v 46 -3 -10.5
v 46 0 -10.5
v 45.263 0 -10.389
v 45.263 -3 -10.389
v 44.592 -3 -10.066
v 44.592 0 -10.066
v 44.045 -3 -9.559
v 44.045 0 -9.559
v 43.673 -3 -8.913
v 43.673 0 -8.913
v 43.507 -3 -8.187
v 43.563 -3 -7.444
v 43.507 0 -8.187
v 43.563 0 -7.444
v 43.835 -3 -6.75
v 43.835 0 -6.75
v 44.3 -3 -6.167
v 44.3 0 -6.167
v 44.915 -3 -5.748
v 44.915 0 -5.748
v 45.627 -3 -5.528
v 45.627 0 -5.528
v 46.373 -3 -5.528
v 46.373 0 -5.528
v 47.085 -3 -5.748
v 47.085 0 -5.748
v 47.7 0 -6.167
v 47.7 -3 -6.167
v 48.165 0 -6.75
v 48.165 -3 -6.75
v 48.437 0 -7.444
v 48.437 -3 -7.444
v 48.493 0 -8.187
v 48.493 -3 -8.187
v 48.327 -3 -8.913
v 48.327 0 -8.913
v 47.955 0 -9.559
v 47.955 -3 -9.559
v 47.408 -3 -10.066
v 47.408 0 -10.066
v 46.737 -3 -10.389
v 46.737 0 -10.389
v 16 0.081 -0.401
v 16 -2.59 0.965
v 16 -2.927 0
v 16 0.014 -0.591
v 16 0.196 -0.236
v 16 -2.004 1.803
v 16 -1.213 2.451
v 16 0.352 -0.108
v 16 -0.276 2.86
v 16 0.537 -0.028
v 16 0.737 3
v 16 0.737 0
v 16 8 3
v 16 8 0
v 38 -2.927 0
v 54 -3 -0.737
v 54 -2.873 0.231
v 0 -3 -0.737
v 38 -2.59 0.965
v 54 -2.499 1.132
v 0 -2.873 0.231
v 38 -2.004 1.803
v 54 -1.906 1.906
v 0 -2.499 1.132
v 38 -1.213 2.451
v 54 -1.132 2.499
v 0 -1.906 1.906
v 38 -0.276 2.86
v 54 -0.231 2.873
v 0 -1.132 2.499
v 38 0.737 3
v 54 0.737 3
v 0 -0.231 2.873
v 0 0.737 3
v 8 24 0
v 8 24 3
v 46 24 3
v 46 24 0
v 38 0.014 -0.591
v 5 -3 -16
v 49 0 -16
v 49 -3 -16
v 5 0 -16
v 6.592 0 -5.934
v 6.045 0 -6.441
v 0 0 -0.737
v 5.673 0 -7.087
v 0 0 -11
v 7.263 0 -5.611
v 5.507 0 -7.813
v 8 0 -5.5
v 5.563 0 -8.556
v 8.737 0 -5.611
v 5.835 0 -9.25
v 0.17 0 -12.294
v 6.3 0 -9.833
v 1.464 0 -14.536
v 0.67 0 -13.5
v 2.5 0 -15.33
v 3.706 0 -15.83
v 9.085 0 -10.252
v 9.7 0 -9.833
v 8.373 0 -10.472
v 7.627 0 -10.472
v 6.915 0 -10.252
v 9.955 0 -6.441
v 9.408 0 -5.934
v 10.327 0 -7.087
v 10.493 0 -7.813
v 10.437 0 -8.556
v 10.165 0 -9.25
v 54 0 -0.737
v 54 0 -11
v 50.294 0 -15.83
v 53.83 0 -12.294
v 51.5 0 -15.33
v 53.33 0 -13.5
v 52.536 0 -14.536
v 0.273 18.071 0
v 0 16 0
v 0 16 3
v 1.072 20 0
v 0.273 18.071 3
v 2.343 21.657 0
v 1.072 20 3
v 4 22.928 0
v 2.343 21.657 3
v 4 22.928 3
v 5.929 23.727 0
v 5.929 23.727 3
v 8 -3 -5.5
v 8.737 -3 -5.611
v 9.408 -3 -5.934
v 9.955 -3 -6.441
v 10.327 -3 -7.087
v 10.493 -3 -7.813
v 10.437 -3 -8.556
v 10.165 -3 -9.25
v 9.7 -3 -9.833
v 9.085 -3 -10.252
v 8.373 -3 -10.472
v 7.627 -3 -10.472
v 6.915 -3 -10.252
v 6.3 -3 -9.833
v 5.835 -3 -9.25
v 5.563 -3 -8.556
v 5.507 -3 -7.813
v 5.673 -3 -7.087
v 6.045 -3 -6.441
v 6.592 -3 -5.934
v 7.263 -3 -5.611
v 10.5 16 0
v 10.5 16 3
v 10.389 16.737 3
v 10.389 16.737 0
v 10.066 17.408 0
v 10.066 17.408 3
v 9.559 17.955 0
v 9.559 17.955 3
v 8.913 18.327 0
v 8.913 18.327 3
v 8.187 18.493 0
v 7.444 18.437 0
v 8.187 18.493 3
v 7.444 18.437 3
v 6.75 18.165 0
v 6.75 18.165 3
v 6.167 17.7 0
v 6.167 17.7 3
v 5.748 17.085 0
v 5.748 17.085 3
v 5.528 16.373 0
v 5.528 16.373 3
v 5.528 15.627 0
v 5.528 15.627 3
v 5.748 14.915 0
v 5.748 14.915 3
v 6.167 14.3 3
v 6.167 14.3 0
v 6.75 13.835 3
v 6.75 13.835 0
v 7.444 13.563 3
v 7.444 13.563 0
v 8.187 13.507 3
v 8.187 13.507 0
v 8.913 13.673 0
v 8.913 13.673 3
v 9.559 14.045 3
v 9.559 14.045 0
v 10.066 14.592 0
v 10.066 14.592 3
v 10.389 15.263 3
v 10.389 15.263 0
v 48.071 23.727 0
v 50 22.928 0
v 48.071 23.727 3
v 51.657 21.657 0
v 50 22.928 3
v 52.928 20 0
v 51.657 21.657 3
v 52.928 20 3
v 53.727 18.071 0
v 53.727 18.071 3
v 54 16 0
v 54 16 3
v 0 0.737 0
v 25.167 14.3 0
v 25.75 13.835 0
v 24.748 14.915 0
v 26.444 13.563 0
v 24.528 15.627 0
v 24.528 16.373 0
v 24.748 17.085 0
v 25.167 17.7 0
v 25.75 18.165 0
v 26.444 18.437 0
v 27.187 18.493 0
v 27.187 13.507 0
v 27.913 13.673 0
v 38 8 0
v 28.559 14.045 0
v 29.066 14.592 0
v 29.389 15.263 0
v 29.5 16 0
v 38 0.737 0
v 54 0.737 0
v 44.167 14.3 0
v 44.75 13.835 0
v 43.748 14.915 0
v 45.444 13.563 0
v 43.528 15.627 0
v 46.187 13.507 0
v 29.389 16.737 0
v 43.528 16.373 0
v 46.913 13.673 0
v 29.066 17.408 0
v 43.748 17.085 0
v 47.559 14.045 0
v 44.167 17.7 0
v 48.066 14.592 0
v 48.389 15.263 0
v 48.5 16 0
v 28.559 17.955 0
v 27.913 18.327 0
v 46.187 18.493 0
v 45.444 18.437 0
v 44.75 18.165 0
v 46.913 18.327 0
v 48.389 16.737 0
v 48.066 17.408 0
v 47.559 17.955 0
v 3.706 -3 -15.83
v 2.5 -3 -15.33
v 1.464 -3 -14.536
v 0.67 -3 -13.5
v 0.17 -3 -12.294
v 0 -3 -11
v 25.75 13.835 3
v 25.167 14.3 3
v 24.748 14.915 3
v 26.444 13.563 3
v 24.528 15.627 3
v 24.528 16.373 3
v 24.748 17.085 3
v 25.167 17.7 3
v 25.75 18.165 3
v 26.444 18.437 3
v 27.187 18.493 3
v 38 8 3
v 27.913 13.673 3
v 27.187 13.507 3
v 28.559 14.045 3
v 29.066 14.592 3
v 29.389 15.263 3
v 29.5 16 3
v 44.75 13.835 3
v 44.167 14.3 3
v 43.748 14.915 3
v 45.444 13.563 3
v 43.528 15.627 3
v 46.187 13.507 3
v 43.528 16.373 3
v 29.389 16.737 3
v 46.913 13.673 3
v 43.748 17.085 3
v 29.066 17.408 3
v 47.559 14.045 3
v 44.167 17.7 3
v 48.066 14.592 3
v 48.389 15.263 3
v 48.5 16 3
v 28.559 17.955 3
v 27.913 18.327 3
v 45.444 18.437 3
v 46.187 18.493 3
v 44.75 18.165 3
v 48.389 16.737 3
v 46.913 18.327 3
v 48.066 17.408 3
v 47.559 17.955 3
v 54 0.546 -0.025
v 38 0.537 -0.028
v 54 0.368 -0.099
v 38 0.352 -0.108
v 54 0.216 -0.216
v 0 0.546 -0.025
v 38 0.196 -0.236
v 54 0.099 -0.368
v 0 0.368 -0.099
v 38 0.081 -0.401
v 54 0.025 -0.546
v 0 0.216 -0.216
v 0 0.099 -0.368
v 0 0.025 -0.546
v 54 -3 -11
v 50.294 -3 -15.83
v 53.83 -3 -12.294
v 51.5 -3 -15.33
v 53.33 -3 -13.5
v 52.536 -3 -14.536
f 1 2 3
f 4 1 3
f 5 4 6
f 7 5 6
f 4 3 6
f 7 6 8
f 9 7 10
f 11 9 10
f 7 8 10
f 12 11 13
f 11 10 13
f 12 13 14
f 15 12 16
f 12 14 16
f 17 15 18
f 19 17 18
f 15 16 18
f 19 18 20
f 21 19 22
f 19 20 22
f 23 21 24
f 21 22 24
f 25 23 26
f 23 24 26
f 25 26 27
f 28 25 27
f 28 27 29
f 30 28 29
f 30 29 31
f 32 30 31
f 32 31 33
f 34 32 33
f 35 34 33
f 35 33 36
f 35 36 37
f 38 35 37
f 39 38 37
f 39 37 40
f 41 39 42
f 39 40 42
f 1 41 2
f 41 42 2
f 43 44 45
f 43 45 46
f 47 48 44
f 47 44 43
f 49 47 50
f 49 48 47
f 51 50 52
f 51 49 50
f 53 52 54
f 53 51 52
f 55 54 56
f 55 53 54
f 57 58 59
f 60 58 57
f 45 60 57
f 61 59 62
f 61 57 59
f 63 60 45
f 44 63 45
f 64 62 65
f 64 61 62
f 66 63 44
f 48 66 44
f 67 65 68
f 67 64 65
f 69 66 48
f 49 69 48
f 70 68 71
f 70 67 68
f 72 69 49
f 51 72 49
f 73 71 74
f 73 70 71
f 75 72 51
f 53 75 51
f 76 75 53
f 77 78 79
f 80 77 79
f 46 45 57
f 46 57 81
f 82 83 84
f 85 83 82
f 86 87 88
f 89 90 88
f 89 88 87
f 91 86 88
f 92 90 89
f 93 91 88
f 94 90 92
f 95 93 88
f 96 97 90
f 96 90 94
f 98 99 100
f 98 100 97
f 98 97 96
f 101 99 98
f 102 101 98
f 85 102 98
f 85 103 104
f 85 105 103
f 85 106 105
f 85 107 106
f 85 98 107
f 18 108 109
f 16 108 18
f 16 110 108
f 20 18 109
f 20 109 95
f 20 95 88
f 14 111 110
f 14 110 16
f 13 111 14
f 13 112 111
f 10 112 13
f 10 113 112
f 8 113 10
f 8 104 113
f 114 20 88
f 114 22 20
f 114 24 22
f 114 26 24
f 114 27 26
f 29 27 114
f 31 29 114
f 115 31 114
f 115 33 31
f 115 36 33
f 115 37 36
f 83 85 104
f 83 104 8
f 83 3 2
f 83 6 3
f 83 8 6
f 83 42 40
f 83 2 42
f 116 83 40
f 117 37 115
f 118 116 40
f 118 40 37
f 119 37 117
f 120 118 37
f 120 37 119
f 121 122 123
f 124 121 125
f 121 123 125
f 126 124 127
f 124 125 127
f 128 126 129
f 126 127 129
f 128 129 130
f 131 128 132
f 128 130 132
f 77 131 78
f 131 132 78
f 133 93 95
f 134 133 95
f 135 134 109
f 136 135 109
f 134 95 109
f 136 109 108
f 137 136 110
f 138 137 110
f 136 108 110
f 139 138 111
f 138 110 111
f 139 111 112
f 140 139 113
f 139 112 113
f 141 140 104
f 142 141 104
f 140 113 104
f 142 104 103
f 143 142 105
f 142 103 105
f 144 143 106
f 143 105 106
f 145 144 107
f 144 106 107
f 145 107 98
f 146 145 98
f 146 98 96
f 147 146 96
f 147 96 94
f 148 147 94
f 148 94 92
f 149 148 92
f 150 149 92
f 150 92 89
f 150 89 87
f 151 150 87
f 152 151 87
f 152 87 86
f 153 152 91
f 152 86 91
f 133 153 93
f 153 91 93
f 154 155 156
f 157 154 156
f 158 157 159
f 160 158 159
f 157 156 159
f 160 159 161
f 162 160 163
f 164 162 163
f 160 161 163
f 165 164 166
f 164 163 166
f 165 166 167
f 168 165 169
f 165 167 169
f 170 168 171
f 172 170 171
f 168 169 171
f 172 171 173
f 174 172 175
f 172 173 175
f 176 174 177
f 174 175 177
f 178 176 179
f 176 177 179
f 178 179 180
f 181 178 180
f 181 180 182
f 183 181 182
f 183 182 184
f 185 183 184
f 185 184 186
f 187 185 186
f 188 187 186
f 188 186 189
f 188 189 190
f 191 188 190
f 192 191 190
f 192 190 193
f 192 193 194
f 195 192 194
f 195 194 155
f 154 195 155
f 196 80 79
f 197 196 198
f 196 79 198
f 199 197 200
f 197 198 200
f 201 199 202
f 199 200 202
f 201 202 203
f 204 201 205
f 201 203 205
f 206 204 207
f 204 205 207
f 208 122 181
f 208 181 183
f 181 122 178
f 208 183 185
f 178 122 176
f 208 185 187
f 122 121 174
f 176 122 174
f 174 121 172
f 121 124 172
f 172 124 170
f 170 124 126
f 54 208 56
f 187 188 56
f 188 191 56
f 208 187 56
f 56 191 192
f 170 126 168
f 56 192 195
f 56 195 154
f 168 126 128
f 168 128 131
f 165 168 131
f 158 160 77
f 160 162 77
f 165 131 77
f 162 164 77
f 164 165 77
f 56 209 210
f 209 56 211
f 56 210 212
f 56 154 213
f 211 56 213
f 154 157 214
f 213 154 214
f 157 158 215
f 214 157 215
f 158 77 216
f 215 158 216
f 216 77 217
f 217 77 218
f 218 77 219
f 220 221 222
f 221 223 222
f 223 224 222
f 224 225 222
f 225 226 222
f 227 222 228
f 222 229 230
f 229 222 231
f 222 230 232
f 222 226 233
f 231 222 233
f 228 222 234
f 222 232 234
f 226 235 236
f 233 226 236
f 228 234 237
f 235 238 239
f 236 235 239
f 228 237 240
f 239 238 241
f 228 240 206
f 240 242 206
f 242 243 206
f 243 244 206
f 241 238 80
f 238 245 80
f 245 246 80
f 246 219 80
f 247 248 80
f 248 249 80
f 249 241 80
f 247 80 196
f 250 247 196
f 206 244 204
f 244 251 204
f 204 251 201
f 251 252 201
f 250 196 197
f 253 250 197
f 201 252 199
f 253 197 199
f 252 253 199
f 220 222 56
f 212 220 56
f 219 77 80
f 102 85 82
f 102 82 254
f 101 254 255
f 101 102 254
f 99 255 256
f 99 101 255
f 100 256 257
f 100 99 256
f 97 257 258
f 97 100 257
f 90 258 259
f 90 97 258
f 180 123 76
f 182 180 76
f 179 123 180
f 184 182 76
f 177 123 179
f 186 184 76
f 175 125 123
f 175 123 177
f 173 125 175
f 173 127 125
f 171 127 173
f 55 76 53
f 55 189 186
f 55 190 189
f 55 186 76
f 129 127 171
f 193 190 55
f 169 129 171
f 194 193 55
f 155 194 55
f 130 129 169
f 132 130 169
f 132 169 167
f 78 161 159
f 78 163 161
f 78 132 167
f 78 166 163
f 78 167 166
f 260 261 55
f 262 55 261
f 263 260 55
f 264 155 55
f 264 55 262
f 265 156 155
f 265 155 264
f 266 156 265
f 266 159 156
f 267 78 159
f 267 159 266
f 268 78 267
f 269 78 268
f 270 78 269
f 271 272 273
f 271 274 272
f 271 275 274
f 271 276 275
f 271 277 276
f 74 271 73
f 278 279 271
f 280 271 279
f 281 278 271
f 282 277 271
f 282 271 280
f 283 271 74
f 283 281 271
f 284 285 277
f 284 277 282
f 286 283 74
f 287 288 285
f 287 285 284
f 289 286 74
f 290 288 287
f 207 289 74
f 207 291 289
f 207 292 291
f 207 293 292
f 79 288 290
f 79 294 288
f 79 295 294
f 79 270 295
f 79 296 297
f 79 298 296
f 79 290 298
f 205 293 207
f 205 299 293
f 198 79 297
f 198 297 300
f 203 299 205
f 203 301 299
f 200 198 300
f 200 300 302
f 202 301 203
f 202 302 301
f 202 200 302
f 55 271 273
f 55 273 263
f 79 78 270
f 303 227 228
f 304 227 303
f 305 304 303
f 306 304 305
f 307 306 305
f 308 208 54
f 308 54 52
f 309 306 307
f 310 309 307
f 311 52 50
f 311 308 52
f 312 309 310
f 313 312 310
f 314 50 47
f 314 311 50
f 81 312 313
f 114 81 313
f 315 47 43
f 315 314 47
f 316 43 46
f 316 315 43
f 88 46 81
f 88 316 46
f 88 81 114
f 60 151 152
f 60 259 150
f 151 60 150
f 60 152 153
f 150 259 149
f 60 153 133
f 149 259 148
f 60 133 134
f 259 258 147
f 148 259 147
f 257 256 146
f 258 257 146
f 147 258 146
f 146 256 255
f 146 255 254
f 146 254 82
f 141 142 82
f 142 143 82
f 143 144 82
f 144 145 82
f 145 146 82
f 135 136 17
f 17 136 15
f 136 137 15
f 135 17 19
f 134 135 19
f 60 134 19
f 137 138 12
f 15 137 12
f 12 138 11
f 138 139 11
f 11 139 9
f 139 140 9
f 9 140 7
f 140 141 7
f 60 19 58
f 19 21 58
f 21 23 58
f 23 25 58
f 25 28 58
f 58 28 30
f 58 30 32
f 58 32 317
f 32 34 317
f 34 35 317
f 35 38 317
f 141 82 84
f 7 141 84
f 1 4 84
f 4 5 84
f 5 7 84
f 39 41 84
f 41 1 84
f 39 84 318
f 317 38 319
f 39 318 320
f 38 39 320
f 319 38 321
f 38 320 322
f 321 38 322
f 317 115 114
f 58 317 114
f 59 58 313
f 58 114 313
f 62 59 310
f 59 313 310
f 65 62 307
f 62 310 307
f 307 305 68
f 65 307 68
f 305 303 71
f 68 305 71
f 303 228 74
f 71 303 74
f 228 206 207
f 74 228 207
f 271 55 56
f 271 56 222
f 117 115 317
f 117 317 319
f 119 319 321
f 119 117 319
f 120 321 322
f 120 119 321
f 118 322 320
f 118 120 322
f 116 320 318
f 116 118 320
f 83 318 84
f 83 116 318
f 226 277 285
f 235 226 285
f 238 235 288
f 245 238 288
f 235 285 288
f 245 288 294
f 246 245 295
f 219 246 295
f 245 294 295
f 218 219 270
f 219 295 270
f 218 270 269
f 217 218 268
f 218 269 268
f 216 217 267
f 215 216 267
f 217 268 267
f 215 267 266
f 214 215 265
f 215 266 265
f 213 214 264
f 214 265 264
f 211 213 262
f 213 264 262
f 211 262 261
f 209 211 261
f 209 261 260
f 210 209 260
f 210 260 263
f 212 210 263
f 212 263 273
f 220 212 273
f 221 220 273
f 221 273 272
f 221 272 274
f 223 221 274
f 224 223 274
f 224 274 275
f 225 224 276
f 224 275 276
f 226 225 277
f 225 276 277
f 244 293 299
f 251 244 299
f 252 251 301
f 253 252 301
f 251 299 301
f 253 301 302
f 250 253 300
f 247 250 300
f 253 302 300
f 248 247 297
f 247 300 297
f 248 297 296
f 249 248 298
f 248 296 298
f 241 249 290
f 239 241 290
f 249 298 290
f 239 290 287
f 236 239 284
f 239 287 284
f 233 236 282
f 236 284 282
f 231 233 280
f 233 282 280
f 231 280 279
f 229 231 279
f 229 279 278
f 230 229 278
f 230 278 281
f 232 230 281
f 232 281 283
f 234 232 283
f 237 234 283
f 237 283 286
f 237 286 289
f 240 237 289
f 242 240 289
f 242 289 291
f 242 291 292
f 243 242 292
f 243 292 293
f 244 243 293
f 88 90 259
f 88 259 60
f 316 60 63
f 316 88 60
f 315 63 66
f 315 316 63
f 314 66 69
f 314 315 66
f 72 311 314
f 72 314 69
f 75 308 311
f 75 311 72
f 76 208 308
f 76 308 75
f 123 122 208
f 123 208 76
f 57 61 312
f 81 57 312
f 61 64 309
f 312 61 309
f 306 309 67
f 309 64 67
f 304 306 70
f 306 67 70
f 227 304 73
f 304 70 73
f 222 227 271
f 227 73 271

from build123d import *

# Parameters (mm, degrees)
SKETCH1_R                    = 2.5
BASE_FLANGE1_DEPTH           = 3
EDGE_FLANGE1_STRIP_W         = 13.4732
EDGE_FLANGE1_STRIP_H         = 3
EDGE_FLANGE1_STRIP_CUT_DEPTH = 54
EDGE_FLANGE1_DEPTH           = 54
CUT_EXTRUDE1_START           = 16
CUT_EXTRUDE1_DEPTH           = 22
SKETCH10_R                   = 2.5
CUT_EXTRUDE2_DEPTH           = 10
SKETCH11_W                   = 22
SKETCH11_H                   = 16
SKETCH11_R                   = 2.5
BOSS_EXTRUDE1_DEPTH          = 3


# Read off the part's stored shape, not the designer's step: Cut-Extrude1
# Sheet-metal steps are written as plain solids
with BuildPart() as part:
    # Sketch1 → Base-Flange1 (new body)
    with BuildSketch(Plane(origin=(0, 0, 0), x_dir=(1, 0, 0), z_dir=(0, 1, 0))):
        with BuildLine():
            Line((0, 0), (54, 0))
            Line((54, 0), (54, 11))
            ThreePointArc((54, 11), (52.535533906, 14.535533906), (49, 16))
            Line((49, 16), (5, 16))
            ThreePointArc((5, 16), (1.464466094, 14.535533906), (0, 11))
            Line((0, 11), (0, 0))
        make_face()
        with Locations(Location((8, 8, 0), (0, 0, 270))):
            Circle(SKETCH1_R, mode=Mode.SUBTRACT)
        with Locations(Location((46, 8, 0), (0, 0, 90))):
            Circle(SKETCH1_R, mode=Mode.SUBTRACT)
    extrude(amount=-BASE_FLANGE1_DEPTH)

    # Edge-Flange1 strip (across the edge) → Edge-Flange1 strip cut (cut)
    with BuildSketch(Plane(origin=(0, 0, 0), x_dir=(0, 0, -1), z_dir=(1, 0, 0))):
        with Locations((-6, -1.5)):
            Rectangle(EDGE_FLANGE1_STRIP_W, EDGE_FLANGE1_STRIP_H)
    extrude(amount=EDGE_FLANGE1_STRIP_CUT_DEPTH, mode=Mode.SUBTRACT)

    # Edge-Flange1 section (across the edge) → Edge-Flange1 (add)
    with BuildSketch(Plane(origin=(0, 0, 0), x_dir=(0, 0, -1), z_dir=(1, 0, 0))):
        with BuildLine():
            Line((-3, 0.7366), (-3, 24))
            Line((-3, 24), (0, 24))
            Line((0, 24), (0, 0.7366))
            ThreePointArc((0, 0.7366), (0.215745145, 0.215745145), (0.7366, 0))
            Line((0.7366, 0), (0.7366, -3))
            ThreePointArc((0.7366, -3), (-1.905575199, -1.905575199), (-3, 0.7366))
        make_face()
    extrude(amount=EDGE_FLANGE1_DEPTH)

    # Cut-Extrude1 outline → Cut-Extrude1 (cut)
    with BuildSketch(Plane.YZ.offset(CUT_EXTRUDE1_START)):
        with BuildLine():
            Line((-2.926677222, 0), (0.014454199, -0.591393245))
            ThreePointArc((0.014454199, -0.591393245), (0.269898669, -0.166714548), (0.7366, 0))
            Line((0.7366, 0), (24, 0))
            Line((24, 0), (24, 3))
            Line((24, 3), (0.7366, 3))
            ThreePointArc((0.7366, 3), (-1.630867001, 2.154295979), (-2.926677222, 0))
        make_face()
    extrude(amount=CUT_EXTRUDE1_DEPTH, mode=Mode.SUBTRACT)

    # Sketch10 → Cut-Extrude2 (cut)
    with BuildSketch(Plane.XY.offset(3)):
        with BuildLine():
            ThreePointArc((46, 24), (51.656854249, 21.656854249), (54, 16))
            Line((54, 16), (54, 24))
            Line((54, 24), (46, 24))
        make_face()
        with Locations((46, 16)):
            Circle(SKETCH10_R)
        with Locations((8, 16)):
            Circle(SKETCH10_R)
        with BuildLine():
            ThreePointArc((0, 16), (2.343145751, 21.656854249), (8, 24))
            Line((8, 24), (0, 24))
            Line((0, 24), (0, 16))
        make_face()
    extrude(amount=-CUT_EXTRUDE2_DEPTH, mode=Mode.SUBTRACT)

    # Sketch11 → Boss-Extrude1 (add)
    with BuildSketch(Plane.XY.offset(3)):
        with Locations((27, 16)):
            Rectangle(SKETCH11_W, SKETCH11_H)
        with Locations((27, 16)):
            Circle(SKETCH11_R, mode=Mode.SUBTRACT)
    extrude(amount=-BOSS_EXTRUDE1_DEPTH)


solid = part.part
